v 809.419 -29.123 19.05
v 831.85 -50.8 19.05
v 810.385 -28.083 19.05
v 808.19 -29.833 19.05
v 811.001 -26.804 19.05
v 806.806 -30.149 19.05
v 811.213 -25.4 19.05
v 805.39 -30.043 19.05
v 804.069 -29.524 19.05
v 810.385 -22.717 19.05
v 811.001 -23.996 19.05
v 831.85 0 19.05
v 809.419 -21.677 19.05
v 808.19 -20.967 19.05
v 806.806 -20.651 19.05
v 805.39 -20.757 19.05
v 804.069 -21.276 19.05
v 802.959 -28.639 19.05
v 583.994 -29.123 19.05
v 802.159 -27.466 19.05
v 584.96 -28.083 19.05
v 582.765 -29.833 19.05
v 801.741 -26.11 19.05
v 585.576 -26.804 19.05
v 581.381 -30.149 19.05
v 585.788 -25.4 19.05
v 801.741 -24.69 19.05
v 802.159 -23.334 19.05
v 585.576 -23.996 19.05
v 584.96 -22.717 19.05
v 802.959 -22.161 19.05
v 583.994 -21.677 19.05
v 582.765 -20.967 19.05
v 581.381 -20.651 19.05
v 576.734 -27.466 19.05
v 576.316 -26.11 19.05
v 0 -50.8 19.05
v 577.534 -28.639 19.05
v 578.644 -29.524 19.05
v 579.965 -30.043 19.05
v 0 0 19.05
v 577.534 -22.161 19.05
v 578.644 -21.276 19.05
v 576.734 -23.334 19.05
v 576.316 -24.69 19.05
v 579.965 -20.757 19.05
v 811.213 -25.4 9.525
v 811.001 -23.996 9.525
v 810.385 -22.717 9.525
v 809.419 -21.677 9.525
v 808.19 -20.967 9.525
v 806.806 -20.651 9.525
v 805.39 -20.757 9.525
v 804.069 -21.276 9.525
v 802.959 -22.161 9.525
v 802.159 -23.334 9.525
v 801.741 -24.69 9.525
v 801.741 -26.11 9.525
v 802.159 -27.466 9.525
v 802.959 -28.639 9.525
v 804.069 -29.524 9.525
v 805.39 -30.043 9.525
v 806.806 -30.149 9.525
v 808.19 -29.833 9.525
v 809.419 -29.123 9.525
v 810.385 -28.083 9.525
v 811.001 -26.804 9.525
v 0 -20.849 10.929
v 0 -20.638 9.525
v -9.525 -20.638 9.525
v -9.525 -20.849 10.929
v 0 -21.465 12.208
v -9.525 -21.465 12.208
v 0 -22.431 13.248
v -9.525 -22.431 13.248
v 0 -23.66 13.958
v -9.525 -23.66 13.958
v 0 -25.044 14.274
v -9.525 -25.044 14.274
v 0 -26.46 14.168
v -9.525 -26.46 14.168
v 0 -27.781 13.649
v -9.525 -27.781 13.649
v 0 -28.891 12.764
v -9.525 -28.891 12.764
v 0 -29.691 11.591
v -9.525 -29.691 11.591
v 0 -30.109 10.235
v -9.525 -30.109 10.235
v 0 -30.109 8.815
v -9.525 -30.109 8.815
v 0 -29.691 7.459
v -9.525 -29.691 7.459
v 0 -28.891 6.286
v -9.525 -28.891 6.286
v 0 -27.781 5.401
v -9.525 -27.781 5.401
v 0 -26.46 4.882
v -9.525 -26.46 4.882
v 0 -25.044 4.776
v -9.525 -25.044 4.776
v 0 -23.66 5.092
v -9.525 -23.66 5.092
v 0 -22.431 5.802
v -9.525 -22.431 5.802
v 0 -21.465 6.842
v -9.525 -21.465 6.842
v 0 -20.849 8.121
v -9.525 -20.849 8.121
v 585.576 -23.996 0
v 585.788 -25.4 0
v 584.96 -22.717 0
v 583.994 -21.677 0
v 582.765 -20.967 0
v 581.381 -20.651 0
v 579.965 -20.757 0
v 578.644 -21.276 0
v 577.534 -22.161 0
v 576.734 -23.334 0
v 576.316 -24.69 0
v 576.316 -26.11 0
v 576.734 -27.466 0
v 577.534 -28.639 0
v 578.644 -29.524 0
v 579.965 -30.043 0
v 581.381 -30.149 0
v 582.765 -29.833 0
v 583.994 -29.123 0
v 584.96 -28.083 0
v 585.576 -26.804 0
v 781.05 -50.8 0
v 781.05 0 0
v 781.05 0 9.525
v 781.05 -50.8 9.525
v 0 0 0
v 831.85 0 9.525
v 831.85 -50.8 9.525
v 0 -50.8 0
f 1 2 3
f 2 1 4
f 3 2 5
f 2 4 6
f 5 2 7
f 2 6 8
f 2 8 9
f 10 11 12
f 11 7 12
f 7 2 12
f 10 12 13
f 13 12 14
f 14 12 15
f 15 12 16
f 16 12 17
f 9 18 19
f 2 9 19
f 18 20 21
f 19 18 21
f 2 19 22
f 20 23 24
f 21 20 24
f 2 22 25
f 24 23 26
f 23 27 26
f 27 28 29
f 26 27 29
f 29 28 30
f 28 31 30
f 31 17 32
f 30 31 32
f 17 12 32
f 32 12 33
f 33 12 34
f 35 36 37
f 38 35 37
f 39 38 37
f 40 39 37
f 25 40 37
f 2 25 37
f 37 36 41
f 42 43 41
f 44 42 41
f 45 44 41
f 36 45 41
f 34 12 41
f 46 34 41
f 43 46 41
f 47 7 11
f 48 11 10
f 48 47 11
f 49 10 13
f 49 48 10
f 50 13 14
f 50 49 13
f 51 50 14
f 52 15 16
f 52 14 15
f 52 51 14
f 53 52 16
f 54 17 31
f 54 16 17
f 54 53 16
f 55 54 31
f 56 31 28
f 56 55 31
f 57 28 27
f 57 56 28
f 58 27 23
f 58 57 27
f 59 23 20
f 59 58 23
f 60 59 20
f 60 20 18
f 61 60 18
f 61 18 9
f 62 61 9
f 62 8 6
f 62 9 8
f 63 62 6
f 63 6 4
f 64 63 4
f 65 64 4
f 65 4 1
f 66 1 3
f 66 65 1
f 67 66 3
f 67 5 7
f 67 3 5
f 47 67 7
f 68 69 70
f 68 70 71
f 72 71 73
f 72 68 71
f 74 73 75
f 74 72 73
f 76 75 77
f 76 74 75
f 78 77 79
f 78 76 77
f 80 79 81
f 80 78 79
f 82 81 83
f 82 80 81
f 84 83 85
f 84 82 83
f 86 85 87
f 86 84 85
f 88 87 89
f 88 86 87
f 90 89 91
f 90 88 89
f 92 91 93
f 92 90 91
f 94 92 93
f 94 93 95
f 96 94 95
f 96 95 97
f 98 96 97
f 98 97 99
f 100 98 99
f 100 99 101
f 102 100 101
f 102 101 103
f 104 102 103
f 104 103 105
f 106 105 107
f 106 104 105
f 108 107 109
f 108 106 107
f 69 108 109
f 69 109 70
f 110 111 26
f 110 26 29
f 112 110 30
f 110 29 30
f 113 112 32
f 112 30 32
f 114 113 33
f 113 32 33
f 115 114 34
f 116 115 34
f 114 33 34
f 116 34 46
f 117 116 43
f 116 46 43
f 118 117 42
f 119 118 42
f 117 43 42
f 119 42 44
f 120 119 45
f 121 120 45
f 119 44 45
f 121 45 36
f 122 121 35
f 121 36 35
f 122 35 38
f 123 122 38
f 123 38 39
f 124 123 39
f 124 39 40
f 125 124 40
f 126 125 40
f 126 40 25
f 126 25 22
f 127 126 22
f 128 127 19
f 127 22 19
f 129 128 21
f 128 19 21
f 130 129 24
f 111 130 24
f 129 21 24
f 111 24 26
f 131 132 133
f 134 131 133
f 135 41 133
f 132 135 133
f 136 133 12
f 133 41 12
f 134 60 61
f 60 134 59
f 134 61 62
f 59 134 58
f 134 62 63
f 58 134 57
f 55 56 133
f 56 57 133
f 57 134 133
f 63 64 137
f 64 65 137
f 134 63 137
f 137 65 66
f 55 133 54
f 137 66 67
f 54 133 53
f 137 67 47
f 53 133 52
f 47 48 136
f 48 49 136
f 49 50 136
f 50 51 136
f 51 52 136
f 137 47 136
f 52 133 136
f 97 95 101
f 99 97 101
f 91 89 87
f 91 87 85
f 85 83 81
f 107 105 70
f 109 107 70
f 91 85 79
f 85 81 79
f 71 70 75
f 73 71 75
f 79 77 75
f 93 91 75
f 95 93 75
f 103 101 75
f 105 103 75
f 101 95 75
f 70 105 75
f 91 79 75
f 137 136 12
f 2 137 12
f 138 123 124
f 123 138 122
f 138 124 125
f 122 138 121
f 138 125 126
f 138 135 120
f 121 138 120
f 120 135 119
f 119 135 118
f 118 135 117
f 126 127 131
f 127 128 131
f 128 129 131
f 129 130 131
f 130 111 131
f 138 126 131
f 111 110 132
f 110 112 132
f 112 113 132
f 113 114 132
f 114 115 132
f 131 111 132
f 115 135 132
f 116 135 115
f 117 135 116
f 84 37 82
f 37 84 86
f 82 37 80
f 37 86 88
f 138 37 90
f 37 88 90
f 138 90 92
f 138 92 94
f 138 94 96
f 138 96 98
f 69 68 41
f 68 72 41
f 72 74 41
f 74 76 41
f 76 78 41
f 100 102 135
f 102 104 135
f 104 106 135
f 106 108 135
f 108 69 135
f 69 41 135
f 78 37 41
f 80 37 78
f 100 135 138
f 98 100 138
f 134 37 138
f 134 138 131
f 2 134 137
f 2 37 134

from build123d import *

# Parameters (mm, degrees)
F1_DEPTH = 50.8
F3_R     = 4.7625
F4_DEPTH = 12.7
F5_R     = 4.7625
F6_DEPTH = 9.525


with BuildPart() as f1:
    # F0 (on Front) → F1 (new body)
    with BuildSketch(Plane.XZ):
        Polygon((831.85, 9.525), (831.85, 19.05), (0, 19.05), (0, 0), (781.05, 0), (781.05, 9.525), align=None)
    extrude(amount=F1_DEPTH)

    # F3 (on offset) → F4 (cut, symmetric)
    with BuildSketch(Plane.XY.offset(9.525)):
        with Locations((806.45, -25.4)):
            Circle(F3_R)
        with Locations((581.025, -25.4)):
            Circle(F3_R)
    extrude(amount=F4_DEPTH, both=True, mode=Mode.SUBTRACT)

    # F5 (on Right) → F6 (join)
    with BuildSketch(Plane.YZ):
        with Locations((-25.4, 9.525)):
            Circle(F5_R)
    extrude(amount=-F6_DEPTH)


solid = f1.part
